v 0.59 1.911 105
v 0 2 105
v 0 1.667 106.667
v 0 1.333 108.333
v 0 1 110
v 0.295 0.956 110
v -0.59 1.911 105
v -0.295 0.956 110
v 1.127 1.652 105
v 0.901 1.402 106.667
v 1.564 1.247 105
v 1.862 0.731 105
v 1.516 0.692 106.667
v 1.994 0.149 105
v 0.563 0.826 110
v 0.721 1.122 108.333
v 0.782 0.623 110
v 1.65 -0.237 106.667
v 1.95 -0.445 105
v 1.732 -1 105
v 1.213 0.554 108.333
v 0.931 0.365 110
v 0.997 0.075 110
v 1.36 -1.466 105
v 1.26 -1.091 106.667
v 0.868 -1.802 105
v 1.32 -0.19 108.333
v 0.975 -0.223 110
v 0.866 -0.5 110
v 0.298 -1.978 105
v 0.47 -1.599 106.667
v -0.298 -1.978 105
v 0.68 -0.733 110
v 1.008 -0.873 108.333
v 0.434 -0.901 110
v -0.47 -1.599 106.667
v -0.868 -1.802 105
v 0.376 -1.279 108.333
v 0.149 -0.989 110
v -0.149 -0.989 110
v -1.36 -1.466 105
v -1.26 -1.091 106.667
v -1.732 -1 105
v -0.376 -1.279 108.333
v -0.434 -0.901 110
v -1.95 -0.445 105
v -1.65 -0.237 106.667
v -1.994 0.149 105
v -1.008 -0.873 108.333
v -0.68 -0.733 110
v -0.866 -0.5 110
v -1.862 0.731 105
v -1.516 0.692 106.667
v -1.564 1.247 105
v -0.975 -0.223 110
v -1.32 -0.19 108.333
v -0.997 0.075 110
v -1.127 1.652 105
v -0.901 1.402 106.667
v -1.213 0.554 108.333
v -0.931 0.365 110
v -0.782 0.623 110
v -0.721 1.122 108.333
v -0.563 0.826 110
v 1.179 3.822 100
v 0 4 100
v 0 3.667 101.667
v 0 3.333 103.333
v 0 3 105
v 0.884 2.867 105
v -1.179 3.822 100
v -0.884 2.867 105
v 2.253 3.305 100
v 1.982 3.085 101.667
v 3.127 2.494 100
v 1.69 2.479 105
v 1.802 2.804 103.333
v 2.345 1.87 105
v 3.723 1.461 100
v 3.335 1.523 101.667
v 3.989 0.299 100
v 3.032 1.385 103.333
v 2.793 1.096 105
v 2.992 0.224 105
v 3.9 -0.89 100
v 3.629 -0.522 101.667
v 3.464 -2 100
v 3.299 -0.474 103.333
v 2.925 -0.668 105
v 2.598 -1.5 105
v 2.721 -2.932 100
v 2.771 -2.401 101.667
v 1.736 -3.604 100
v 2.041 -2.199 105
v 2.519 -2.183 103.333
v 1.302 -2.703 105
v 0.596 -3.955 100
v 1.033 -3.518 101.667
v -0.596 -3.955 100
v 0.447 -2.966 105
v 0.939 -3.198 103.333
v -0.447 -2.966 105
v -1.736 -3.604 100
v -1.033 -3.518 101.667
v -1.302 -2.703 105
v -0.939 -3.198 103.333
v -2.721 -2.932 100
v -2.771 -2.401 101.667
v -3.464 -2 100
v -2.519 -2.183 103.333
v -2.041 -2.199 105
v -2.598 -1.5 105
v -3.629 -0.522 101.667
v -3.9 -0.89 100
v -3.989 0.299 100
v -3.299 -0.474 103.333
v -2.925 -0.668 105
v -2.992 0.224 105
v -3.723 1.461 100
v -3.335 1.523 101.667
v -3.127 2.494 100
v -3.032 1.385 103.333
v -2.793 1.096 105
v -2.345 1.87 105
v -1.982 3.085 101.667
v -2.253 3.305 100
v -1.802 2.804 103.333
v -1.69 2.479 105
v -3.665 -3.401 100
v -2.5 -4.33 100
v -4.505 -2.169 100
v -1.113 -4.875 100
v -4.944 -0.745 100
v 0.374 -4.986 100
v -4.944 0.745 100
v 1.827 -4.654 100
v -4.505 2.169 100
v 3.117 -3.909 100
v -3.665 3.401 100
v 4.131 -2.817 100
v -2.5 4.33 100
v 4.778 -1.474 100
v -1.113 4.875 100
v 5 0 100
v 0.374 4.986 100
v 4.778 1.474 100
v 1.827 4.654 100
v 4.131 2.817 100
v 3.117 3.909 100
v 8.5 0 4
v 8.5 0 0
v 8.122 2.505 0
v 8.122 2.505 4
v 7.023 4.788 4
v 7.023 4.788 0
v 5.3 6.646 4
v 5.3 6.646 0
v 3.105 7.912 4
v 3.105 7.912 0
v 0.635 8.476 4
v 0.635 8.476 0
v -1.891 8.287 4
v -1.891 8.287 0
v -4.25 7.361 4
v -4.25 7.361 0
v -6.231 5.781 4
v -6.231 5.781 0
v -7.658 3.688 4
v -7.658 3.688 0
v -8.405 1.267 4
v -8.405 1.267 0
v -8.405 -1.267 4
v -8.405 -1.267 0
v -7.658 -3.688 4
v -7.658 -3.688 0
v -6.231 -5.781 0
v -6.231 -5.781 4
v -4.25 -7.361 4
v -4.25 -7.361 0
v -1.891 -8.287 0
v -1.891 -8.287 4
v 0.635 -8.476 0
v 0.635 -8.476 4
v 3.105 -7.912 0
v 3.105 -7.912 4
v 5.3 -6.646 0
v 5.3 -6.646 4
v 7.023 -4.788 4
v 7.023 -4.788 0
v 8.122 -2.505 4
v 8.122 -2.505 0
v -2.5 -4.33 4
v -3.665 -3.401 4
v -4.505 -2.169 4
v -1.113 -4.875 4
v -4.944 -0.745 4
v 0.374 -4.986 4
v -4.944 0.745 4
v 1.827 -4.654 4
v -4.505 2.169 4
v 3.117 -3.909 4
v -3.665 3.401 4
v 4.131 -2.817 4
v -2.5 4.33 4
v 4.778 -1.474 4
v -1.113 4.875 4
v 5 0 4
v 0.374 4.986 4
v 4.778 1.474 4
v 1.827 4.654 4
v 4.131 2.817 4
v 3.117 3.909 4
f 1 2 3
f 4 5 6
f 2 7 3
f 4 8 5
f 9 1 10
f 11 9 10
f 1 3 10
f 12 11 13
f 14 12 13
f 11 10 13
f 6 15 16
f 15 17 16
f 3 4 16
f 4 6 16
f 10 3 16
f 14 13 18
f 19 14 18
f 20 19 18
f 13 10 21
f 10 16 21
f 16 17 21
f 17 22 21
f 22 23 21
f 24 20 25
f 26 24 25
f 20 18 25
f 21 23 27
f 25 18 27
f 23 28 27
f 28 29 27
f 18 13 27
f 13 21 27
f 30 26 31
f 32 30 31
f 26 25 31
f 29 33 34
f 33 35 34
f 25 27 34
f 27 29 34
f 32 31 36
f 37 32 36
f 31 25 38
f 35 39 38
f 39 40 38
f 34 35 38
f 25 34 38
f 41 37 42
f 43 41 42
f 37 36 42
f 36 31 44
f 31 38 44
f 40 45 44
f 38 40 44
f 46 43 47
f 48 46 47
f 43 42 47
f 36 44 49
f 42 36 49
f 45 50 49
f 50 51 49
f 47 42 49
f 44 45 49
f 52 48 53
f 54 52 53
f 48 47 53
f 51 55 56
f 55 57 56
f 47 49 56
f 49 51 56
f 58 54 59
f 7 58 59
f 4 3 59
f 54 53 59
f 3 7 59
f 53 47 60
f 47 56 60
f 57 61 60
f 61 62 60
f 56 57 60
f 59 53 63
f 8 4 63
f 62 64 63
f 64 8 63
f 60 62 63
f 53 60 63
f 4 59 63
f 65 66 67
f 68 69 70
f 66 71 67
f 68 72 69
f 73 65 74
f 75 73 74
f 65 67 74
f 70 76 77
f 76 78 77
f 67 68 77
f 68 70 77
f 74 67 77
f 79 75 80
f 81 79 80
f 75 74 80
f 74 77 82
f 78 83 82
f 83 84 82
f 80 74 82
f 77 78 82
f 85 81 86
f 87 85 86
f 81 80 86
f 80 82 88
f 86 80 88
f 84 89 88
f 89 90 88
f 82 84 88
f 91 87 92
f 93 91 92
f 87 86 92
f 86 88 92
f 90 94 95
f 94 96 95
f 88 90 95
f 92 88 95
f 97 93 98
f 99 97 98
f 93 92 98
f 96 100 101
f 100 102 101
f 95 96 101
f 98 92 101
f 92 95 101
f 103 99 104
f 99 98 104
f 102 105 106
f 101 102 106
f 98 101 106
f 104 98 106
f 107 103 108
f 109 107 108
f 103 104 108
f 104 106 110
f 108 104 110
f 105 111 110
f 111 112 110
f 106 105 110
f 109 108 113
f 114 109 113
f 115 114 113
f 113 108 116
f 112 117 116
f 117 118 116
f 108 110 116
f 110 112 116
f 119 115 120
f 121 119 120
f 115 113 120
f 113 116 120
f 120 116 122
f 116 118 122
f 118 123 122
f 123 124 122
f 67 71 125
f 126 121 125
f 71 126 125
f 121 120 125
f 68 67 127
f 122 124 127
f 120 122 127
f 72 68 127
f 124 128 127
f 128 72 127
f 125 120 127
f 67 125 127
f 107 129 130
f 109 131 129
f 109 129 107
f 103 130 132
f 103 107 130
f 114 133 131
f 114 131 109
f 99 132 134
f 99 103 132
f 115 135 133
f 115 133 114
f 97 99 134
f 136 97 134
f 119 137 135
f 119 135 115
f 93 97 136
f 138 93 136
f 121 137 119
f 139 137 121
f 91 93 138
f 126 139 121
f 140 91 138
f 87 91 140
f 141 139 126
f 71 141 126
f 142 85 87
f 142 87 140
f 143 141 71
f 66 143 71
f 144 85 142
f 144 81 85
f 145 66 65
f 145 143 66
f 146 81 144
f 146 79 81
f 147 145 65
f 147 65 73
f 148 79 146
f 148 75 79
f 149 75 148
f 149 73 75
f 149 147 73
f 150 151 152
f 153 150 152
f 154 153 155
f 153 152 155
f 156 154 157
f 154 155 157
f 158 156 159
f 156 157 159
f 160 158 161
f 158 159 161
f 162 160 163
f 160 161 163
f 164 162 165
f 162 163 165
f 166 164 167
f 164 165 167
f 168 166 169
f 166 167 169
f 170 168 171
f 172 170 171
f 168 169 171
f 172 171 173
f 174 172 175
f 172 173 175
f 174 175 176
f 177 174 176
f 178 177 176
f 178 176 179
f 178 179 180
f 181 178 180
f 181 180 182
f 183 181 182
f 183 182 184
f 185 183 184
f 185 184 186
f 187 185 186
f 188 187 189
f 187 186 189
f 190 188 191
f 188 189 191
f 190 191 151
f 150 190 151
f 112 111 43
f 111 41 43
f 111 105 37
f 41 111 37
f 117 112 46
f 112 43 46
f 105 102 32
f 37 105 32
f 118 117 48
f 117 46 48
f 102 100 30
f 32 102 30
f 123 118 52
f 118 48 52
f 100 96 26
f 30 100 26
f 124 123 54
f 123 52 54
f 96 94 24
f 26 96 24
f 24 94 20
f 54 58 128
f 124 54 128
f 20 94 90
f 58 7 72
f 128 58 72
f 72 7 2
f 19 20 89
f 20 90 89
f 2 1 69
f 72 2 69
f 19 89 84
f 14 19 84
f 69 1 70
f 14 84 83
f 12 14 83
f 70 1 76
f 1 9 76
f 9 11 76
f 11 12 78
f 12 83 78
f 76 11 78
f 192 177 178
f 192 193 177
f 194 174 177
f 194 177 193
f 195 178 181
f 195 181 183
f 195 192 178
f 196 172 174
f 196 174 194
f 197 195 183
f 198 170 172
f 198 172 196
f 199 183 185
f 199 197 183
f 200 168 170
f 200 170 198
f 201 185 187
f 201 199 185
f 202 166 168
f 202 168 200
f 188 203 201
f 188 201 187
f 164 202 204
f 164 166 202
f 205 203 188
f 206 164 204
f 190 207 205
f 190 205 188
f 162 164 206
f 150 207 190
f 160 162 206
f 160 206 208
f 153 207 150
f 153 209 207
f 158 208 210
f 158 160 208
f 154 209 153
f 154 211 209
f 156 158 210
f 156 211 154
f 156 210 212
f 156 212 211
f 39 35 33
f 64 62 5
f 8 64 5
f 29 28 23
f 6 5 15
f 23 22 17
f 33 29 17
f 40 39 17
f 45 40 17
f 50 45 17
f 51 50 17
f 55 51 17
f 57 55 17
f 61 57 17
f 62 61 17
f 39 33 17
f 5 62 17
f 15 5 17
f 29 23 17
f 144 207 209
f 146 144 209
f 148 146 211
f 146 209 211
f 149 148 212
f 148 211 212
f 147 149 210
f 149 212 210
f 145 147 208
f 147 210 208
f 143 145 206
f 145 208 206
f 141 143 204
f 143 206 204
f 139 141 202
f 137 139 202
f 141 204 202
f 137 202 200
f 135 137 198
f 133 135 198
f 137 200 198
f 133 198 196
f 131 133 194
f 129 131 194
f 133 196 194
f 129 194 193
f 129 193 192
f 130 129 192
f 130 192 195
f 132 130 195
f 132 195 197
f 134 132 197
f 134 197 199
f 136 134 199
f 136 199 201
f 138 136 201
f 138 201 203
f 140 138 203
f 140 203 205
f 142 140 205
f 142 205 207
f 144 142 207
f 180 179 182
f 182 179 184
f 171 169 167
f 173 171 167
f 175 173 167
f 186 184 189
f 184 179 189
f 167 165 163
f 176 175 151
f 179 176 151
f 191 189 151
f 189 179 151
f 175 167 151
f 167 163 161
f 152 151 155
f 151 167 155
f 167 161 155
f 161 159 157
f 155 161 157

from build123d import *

# Parameters (mm, degrees)
F0_R     = 8.5
F1_DEPTH = 4
F2_R     = 5
F3_DEPTH = 100


with BuildPart() as f1:
    # F0 (on Top) → F1 (new body)
    with BuildSketch(Plane.XY):
        Circle(F0_R)
    extrude(amount=F1_DEPTH)

    # F2 (on Top) → F3 (join)
    with BuildSketch(Plane.XY):
        Circle(F2_R)
    extrude(amount=F3_DEPTH)

    # F4 (on Right) → F5 (revolve)
    with BuildSketch(Plane.YZ):
        Polygon((3, 105), (0, 105), (0, 100), (4, 100), align=None)
    revolve(axis=Axis((0, 0, 102.5), (0, 0, -1)))

    # F6 (on Right) → F7 (revolve)
    with BuildSketch(Plane.YZ):
        Polygon((1, 110), (0, 110), (0, 105), (2, 105), align=None)
    revolve(axis=Axis((0, 0, 107.5), (0, 0, -1)))


solid = f1.part
